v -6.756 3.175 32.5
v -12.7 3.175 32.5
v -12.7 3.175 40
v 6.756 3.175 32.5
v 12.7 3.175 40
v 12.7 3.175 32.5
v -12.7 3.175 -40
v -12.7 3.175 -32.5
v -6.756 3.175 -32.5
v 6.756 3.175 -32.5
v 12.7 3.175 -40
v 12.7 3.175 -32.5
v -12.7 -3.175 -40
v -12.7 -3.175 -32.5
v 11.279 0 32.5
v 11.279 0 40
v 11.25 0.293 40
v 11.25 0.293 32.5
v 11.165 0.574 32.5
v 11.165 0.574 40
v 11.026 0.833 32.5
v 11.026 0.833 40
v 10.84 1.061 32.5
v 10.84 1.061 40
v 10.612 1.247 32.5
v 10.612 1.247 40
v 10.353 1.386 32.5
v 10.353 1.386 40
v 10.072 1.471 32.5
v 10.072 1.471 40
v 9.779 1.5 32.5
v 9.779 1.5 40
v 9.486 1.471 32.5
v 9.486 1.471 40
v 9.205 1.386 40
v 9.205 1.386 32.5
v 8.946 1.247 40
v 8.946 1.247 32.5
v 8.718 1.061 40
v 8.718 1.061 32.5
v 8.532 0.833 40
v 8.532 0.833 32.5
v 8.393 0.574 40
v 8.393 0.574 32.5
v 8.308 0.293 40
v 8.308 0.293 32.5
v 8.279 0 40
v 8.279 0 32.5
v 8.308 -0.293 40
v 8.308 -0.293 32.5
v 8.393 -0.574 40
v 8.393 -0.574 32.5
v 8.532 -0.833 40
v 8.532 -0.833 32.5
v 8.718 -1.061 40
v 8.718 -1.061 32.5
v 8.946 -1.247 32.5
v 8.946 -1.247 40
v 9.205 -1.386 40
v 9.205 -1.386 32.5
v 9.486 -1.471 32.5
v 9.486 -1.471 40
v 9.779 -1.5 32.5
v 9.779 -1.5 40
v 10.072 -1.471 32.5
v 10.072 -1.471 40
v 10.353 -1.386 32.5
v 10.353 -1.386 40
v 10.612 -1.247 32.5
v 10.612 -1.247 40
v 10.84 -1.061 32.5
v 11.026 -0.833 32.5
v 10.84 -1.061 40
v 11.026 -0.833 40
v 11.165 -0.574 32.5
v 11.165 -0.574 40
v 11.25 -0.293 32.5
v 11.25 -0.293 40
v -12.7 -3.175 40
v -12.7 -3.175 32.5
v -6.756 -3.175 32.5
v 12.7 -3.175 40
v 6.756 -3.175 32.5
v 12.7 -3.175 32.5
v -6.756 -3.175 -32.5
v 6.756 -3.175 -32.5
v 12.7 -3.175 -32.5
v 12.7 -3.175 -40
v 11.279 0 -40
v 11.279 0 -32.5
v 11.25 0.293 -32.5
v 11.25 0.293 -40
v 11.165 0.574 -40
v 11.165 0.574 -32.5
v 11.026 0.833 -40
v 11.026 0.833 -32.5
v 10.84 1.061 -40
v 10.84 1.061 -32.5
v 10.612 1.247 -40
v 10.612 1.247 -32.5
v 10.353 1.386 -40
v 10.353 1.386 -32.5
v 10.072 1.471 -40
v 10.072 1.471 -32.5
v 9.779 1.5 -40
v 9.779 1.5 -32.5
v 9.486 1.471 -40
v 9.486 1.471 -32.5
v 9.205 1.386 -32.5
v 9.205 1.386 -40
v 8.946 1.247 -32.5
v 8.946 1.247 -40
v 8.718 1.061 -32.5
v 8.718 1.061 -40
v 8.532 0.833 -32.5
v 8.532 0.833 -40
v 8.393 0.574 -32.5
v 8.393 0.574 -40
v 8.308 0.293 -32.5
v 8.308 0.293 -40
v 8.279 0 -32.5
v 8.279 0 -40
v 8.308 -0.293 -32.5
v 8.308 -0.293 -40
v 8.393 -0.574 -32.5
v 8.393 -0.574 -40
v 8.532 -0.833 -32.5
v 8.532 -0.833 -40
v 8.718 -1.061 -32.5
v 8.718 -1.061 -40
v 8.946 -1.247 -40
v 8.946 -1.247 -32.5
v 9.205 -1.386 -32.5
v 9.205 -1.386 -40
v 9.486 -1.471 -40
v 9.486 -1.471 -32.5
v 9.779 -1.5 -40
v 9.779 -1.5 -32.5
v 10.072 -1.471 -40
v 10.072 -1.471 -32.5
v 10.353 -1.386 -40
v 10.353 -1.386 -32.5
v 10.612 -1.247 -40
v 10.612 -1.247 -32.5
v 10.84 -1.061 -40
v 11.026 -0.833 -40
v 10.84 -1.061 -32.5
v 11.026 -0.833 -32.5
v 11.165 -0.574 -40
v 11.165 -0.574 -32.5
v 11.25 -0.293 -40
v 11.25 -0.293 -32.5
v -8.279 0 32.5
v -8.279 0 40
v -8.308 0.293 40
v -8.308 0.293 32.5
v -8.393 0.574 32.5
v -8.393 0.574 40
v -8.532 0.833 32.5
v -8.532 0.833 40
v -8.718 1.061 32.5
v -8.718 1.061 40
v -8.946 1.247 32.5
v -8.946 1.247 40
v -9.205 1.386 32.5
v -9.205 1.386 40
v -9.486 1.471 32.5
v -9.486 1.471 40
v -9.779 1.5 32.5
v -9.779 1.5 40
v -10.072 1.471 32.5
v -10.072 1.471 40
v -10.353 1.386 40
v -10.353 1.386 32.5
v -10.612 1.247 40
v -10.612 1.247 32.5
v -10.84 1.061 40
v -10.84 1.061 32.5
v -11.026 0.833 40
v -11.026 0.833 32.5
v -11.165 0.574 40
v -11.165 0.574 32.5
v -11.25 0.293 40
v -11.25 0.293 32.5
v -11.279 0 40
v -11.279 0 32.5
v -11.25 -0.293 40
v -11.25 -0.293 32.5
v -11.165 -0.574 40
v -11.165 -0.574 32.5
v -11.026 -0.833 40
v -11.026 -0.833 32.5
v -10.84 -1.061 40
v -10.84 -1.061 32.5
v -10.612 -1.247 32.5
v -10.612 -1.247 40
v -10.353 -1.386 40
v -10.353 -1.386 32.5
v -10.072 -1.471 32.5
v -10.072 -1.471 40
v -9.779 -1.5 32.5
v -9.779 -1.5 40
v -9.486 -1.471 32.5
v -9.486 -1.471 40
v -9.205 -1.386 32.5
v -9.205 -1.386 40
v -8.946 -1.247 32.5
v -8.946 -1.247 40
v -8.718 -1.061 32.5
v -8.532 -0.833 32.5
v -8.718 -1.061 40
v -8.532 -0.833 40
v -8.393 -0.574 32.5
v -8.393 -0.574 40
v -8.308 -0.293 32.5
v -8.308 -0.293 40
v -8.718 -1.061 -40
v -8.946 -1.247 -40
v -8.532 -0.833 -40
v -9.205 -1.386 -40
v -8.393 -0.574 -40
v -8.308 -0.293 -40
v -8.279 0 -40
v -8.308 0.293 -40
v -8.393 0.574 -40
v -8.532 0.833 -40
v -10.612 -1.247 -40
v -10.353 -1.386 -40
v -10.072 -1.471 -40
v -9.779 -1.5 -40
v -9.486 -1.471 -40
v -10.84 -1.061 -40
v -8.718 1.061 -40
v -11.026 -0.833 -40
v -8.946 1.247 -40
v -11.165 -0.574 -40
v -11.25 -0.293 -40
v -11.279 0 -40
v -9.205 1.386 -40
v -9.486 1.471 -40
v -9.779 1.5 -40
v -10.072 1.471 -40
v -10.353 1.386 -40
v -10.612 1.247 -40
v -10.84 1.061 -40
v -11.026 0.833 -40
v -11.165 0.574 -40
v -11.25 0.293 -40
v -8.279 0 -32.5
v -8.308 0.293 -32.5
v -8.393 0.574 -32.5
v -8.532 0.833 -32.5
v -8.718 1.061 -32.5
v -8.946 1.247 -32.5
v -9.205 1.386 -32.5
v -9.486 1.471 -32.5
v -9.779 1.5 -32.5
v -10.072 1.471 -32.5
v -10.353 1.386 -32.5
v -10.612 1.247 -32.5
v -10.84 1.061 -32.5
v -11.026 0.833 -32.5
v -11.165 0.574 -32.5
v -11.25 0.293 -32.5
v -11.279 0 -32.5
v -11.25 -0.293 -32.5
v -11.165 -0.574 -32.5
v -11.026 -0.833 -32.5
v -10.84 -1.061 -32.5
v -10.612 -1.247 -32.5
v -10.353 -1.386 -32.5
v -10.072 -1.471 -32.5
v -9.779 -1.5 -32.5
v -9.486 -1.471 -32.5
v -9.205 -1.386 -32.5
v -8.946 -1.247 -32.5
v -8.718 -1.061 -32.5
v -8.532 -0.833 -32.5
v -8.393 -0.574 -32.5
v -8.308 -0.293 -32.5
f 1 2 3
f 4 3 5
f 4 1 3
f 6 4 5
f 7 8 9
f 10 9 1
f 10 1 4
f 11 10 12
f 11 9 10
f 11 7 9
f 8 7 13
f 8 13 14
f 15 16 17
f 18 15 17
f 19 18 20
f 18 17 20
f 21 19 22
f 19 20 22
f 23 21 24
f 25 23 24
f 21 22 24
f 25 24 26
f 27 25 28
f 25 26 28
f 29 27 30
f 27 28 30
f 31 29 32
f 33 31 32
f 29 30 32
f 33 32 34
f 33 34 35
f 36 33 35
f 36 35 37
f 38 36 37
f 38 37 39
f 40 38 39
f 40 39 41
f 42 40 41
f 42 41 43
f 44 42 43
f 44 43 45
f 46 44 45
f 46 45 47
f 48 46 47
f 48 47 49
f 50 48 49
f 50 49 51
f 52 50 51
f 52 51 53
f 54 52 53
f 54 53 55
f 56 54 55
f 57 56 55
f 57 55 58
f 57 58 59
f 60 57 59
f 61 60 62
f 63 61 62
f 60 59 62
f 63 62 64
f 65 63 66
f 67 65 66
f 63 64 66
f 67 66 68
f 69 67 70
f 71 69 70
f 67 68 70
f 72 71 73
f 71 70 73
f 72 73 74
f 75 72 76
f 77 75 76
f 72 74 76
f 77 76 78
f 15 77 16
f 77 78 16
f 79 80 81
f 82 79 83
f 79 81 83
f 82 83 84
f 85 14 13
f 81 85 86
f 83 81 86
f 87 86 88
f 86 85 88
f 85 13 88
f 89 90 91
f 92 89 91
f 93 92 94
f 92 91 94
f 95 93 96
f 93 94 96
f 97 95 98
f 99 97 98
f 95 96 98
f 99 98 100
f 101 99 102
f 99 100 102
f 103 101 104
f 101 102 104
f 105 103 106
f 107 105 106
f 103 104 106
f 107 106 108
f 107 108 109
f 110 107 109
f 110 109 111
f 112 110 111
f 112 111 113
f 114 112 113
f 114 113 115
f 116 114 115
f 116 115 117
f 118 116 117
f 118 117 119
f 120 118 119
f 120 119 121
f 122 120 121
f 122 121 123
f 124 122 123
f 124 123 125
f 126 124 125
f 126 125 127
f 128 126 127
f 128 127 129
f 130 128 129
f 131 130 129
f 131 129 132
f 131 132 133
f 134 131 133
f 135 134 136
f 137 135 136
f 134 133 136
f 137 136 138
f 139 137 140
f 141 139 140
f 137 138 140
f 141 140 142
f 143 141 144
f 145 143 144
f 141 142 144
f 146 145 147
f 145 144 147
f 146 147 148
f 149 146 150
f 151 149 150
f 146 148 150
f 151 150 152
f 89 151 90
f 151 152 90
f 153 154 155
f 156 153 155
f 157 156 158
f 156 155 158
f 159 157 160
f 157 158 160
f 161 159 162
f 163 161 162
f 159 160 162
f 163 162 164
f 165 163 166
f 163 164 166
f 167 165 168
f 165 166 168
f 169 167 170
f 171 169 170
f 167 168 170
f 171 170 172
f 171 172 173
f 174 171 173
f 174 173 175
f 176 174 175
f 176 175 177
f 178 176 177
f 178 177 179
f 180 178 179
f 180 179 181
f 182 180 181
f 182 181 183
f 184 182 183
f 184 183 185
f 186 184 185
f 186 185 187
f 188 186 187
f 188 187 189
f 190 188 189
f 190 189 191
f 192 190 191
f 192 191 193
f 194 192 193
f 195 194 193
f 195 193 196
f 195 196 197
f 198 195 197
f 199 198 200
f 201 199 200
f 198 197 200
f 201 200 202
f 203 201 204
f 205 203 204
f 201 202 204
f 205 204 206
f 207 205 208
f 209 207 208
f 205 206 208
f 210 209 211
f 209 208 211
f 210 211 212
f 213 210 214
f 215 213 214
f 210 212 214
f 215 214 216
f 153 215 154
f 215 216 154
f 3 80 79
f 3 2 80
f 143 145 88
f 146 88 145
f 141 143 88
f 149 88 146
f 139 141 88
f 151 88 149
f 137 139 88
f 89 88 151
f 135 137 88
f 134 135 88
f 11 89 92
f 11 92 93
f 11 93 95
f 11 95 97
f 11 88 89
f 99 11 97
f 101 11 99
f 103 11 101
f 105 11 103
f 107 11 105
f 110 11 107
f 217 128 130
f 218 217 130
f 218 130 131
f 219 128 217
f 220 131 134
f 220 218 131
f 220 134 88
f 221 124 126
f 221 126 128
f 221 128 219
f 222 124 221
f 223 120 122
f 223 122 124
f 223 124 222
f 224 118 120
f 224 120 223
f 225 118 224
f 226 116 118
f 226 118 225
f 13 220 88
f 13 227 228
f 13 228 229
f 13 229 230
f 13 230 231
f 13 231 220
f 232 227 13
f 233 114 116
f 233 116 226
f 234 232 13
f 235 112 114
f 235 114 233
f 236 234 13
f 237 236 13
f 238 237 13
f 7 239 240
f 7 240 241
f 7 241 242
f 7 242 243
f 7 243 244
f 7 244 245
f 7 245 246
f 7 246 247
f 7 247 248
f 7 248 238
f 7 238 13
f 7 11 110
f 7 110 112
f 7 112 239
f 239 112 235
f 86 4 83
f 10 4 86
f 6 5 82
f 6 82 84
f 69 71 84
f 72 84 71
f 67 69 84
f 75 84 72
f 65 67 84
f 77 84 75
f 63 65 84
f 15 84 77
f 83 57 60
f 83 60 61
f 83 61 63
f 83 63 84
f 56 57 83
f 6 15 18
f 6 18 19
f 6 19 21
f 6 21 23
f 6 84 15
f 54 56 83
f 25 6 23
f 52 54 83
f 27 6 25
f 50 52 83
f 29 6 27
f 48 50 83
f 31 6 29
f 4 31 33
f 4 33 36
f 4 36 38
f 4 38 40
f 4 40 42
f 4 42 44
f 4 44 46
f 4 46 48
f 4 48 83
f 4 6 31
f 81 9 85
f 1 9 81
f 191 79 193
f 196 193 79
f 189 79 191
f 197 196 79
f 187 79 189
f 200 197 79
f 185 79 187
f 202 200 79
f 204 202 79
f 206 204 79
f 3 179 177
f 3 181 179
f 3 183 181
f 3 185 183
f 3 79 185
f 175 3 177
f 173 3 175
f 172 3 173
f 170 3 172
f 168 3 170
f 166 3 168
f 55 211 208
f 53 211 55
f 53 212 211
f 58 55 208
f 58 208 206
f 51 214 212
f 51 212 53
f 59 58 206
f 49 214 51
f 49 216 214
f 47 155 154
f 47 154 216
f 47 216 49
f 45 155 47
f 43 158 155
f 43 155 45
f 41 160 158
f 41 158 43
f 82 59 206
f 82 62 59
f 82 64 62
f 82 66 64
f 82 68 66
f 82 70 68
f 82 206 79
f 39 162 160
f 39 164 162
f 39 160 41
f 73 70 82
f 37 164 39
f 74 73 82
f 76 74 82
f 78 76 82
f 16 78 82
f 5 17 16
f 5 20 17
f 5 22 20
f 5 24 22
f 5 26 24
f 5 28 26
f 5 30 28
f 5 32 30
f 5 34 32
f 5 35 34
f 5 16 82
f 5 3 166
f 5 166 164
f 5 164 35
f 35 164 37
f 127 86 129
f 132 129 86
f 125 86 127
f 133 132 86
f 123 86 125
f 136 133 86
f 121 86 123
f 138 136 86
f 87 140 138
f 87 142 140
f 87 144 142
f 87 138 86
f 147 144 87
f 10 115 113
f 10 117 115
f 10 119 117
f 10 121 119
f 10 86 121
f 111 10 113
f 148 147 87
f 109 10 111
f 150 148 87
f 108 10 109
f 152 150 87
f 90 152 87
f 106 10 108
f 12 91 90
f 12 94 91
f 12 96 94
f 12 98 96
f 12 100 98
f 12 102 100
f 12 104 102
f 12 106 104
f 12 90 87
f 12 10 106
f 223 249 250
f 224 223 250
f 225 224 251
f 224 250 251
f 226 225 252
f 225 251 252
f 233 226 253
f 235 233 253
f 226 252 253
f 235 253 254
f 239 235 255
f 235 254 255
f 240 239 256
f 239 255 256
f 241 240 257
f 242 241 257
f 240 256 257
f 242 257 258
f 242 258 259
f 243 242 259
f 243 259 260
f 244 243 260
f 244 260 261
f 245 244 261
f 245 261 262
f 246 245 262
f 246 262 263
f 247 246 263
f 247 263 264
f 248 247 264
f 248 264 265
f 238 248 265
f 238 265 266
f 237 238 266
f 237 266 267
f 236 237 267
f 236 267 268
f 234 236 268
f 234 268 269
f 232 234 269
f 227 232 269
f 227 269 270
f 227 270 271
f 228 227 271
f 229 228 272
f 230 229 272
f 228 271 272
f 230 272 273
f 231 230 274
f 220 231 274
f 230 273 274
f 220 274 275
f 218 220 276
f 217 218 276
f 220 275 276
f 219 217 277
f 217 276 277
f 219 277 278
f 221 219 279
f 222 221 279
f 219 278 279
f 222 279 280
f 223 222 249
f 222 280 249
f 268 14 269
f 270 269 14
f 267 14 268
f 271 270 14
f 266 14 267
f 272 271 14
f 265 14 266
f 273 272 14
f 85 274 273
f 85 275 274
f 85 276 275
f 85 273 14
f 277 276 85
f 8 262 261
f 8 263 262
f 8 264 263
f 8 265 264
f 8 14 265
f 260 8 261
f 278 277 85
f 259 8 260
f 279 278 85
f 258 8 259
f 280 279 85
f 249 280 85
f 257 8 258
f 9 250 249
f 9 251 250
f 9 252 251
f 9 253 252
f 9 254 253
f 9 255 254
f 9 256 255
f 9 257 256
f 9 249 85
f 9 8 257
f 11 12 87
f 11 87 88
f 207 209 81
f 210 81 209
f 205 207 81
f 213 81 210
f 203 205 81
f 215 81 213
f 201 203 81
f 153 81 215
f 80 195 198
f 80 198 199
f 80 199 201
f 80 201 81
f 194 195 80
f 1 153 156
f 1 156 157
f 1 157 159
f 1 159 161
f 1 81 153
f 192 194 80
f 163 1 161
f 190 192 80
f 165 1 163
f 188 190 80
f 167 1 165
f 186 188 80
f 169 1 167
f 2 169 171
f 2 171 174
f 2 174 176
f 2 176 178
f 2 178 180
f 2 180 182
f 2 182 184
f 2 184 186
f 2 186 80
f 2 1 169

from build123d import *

# Parameters (mm, degrees)
BOSS_EXTRUDE3_DEPTH   = 3.175
F_3_0MM_DOWEL_HOLE1_D = 3


with BuildPart() as part:
    # Sketch7 → Boss-Extrude3 (new, symmetric)
    with BuildSketch(Plane(origin=(0, 0, 0), x_dir=(1, 0, 0), z_dir=(0, 1, 0))):
        Polygon((-12.7, -32.5), (-12.7, -40), (12.7, -40), (12.7, -32.5), (6.7564, -32.5), (6.7564, 32.5), (12.7, 32.5), (12.7, 40), (-12.7, 40), (-12.7, 32.5), (-6.7564, 32.5), (-6.7564, -32.5), align=None)
    extrude(amount=BOSS_EXTRUDE3_DEPTH, both=True)

    # Ø3.0mm Dowel Hole1 (through all)
    with Locations(Plane(origin=(0, 0, -40), x_dir=(-1, 0, 0), z_dir=(0, 0, -1))):
        with Locations((-9.779, 0), (9.779, 0)):
            Hole(F_3_0MM_DOWEL_HOLE1_D / 2)


solid = part.part
